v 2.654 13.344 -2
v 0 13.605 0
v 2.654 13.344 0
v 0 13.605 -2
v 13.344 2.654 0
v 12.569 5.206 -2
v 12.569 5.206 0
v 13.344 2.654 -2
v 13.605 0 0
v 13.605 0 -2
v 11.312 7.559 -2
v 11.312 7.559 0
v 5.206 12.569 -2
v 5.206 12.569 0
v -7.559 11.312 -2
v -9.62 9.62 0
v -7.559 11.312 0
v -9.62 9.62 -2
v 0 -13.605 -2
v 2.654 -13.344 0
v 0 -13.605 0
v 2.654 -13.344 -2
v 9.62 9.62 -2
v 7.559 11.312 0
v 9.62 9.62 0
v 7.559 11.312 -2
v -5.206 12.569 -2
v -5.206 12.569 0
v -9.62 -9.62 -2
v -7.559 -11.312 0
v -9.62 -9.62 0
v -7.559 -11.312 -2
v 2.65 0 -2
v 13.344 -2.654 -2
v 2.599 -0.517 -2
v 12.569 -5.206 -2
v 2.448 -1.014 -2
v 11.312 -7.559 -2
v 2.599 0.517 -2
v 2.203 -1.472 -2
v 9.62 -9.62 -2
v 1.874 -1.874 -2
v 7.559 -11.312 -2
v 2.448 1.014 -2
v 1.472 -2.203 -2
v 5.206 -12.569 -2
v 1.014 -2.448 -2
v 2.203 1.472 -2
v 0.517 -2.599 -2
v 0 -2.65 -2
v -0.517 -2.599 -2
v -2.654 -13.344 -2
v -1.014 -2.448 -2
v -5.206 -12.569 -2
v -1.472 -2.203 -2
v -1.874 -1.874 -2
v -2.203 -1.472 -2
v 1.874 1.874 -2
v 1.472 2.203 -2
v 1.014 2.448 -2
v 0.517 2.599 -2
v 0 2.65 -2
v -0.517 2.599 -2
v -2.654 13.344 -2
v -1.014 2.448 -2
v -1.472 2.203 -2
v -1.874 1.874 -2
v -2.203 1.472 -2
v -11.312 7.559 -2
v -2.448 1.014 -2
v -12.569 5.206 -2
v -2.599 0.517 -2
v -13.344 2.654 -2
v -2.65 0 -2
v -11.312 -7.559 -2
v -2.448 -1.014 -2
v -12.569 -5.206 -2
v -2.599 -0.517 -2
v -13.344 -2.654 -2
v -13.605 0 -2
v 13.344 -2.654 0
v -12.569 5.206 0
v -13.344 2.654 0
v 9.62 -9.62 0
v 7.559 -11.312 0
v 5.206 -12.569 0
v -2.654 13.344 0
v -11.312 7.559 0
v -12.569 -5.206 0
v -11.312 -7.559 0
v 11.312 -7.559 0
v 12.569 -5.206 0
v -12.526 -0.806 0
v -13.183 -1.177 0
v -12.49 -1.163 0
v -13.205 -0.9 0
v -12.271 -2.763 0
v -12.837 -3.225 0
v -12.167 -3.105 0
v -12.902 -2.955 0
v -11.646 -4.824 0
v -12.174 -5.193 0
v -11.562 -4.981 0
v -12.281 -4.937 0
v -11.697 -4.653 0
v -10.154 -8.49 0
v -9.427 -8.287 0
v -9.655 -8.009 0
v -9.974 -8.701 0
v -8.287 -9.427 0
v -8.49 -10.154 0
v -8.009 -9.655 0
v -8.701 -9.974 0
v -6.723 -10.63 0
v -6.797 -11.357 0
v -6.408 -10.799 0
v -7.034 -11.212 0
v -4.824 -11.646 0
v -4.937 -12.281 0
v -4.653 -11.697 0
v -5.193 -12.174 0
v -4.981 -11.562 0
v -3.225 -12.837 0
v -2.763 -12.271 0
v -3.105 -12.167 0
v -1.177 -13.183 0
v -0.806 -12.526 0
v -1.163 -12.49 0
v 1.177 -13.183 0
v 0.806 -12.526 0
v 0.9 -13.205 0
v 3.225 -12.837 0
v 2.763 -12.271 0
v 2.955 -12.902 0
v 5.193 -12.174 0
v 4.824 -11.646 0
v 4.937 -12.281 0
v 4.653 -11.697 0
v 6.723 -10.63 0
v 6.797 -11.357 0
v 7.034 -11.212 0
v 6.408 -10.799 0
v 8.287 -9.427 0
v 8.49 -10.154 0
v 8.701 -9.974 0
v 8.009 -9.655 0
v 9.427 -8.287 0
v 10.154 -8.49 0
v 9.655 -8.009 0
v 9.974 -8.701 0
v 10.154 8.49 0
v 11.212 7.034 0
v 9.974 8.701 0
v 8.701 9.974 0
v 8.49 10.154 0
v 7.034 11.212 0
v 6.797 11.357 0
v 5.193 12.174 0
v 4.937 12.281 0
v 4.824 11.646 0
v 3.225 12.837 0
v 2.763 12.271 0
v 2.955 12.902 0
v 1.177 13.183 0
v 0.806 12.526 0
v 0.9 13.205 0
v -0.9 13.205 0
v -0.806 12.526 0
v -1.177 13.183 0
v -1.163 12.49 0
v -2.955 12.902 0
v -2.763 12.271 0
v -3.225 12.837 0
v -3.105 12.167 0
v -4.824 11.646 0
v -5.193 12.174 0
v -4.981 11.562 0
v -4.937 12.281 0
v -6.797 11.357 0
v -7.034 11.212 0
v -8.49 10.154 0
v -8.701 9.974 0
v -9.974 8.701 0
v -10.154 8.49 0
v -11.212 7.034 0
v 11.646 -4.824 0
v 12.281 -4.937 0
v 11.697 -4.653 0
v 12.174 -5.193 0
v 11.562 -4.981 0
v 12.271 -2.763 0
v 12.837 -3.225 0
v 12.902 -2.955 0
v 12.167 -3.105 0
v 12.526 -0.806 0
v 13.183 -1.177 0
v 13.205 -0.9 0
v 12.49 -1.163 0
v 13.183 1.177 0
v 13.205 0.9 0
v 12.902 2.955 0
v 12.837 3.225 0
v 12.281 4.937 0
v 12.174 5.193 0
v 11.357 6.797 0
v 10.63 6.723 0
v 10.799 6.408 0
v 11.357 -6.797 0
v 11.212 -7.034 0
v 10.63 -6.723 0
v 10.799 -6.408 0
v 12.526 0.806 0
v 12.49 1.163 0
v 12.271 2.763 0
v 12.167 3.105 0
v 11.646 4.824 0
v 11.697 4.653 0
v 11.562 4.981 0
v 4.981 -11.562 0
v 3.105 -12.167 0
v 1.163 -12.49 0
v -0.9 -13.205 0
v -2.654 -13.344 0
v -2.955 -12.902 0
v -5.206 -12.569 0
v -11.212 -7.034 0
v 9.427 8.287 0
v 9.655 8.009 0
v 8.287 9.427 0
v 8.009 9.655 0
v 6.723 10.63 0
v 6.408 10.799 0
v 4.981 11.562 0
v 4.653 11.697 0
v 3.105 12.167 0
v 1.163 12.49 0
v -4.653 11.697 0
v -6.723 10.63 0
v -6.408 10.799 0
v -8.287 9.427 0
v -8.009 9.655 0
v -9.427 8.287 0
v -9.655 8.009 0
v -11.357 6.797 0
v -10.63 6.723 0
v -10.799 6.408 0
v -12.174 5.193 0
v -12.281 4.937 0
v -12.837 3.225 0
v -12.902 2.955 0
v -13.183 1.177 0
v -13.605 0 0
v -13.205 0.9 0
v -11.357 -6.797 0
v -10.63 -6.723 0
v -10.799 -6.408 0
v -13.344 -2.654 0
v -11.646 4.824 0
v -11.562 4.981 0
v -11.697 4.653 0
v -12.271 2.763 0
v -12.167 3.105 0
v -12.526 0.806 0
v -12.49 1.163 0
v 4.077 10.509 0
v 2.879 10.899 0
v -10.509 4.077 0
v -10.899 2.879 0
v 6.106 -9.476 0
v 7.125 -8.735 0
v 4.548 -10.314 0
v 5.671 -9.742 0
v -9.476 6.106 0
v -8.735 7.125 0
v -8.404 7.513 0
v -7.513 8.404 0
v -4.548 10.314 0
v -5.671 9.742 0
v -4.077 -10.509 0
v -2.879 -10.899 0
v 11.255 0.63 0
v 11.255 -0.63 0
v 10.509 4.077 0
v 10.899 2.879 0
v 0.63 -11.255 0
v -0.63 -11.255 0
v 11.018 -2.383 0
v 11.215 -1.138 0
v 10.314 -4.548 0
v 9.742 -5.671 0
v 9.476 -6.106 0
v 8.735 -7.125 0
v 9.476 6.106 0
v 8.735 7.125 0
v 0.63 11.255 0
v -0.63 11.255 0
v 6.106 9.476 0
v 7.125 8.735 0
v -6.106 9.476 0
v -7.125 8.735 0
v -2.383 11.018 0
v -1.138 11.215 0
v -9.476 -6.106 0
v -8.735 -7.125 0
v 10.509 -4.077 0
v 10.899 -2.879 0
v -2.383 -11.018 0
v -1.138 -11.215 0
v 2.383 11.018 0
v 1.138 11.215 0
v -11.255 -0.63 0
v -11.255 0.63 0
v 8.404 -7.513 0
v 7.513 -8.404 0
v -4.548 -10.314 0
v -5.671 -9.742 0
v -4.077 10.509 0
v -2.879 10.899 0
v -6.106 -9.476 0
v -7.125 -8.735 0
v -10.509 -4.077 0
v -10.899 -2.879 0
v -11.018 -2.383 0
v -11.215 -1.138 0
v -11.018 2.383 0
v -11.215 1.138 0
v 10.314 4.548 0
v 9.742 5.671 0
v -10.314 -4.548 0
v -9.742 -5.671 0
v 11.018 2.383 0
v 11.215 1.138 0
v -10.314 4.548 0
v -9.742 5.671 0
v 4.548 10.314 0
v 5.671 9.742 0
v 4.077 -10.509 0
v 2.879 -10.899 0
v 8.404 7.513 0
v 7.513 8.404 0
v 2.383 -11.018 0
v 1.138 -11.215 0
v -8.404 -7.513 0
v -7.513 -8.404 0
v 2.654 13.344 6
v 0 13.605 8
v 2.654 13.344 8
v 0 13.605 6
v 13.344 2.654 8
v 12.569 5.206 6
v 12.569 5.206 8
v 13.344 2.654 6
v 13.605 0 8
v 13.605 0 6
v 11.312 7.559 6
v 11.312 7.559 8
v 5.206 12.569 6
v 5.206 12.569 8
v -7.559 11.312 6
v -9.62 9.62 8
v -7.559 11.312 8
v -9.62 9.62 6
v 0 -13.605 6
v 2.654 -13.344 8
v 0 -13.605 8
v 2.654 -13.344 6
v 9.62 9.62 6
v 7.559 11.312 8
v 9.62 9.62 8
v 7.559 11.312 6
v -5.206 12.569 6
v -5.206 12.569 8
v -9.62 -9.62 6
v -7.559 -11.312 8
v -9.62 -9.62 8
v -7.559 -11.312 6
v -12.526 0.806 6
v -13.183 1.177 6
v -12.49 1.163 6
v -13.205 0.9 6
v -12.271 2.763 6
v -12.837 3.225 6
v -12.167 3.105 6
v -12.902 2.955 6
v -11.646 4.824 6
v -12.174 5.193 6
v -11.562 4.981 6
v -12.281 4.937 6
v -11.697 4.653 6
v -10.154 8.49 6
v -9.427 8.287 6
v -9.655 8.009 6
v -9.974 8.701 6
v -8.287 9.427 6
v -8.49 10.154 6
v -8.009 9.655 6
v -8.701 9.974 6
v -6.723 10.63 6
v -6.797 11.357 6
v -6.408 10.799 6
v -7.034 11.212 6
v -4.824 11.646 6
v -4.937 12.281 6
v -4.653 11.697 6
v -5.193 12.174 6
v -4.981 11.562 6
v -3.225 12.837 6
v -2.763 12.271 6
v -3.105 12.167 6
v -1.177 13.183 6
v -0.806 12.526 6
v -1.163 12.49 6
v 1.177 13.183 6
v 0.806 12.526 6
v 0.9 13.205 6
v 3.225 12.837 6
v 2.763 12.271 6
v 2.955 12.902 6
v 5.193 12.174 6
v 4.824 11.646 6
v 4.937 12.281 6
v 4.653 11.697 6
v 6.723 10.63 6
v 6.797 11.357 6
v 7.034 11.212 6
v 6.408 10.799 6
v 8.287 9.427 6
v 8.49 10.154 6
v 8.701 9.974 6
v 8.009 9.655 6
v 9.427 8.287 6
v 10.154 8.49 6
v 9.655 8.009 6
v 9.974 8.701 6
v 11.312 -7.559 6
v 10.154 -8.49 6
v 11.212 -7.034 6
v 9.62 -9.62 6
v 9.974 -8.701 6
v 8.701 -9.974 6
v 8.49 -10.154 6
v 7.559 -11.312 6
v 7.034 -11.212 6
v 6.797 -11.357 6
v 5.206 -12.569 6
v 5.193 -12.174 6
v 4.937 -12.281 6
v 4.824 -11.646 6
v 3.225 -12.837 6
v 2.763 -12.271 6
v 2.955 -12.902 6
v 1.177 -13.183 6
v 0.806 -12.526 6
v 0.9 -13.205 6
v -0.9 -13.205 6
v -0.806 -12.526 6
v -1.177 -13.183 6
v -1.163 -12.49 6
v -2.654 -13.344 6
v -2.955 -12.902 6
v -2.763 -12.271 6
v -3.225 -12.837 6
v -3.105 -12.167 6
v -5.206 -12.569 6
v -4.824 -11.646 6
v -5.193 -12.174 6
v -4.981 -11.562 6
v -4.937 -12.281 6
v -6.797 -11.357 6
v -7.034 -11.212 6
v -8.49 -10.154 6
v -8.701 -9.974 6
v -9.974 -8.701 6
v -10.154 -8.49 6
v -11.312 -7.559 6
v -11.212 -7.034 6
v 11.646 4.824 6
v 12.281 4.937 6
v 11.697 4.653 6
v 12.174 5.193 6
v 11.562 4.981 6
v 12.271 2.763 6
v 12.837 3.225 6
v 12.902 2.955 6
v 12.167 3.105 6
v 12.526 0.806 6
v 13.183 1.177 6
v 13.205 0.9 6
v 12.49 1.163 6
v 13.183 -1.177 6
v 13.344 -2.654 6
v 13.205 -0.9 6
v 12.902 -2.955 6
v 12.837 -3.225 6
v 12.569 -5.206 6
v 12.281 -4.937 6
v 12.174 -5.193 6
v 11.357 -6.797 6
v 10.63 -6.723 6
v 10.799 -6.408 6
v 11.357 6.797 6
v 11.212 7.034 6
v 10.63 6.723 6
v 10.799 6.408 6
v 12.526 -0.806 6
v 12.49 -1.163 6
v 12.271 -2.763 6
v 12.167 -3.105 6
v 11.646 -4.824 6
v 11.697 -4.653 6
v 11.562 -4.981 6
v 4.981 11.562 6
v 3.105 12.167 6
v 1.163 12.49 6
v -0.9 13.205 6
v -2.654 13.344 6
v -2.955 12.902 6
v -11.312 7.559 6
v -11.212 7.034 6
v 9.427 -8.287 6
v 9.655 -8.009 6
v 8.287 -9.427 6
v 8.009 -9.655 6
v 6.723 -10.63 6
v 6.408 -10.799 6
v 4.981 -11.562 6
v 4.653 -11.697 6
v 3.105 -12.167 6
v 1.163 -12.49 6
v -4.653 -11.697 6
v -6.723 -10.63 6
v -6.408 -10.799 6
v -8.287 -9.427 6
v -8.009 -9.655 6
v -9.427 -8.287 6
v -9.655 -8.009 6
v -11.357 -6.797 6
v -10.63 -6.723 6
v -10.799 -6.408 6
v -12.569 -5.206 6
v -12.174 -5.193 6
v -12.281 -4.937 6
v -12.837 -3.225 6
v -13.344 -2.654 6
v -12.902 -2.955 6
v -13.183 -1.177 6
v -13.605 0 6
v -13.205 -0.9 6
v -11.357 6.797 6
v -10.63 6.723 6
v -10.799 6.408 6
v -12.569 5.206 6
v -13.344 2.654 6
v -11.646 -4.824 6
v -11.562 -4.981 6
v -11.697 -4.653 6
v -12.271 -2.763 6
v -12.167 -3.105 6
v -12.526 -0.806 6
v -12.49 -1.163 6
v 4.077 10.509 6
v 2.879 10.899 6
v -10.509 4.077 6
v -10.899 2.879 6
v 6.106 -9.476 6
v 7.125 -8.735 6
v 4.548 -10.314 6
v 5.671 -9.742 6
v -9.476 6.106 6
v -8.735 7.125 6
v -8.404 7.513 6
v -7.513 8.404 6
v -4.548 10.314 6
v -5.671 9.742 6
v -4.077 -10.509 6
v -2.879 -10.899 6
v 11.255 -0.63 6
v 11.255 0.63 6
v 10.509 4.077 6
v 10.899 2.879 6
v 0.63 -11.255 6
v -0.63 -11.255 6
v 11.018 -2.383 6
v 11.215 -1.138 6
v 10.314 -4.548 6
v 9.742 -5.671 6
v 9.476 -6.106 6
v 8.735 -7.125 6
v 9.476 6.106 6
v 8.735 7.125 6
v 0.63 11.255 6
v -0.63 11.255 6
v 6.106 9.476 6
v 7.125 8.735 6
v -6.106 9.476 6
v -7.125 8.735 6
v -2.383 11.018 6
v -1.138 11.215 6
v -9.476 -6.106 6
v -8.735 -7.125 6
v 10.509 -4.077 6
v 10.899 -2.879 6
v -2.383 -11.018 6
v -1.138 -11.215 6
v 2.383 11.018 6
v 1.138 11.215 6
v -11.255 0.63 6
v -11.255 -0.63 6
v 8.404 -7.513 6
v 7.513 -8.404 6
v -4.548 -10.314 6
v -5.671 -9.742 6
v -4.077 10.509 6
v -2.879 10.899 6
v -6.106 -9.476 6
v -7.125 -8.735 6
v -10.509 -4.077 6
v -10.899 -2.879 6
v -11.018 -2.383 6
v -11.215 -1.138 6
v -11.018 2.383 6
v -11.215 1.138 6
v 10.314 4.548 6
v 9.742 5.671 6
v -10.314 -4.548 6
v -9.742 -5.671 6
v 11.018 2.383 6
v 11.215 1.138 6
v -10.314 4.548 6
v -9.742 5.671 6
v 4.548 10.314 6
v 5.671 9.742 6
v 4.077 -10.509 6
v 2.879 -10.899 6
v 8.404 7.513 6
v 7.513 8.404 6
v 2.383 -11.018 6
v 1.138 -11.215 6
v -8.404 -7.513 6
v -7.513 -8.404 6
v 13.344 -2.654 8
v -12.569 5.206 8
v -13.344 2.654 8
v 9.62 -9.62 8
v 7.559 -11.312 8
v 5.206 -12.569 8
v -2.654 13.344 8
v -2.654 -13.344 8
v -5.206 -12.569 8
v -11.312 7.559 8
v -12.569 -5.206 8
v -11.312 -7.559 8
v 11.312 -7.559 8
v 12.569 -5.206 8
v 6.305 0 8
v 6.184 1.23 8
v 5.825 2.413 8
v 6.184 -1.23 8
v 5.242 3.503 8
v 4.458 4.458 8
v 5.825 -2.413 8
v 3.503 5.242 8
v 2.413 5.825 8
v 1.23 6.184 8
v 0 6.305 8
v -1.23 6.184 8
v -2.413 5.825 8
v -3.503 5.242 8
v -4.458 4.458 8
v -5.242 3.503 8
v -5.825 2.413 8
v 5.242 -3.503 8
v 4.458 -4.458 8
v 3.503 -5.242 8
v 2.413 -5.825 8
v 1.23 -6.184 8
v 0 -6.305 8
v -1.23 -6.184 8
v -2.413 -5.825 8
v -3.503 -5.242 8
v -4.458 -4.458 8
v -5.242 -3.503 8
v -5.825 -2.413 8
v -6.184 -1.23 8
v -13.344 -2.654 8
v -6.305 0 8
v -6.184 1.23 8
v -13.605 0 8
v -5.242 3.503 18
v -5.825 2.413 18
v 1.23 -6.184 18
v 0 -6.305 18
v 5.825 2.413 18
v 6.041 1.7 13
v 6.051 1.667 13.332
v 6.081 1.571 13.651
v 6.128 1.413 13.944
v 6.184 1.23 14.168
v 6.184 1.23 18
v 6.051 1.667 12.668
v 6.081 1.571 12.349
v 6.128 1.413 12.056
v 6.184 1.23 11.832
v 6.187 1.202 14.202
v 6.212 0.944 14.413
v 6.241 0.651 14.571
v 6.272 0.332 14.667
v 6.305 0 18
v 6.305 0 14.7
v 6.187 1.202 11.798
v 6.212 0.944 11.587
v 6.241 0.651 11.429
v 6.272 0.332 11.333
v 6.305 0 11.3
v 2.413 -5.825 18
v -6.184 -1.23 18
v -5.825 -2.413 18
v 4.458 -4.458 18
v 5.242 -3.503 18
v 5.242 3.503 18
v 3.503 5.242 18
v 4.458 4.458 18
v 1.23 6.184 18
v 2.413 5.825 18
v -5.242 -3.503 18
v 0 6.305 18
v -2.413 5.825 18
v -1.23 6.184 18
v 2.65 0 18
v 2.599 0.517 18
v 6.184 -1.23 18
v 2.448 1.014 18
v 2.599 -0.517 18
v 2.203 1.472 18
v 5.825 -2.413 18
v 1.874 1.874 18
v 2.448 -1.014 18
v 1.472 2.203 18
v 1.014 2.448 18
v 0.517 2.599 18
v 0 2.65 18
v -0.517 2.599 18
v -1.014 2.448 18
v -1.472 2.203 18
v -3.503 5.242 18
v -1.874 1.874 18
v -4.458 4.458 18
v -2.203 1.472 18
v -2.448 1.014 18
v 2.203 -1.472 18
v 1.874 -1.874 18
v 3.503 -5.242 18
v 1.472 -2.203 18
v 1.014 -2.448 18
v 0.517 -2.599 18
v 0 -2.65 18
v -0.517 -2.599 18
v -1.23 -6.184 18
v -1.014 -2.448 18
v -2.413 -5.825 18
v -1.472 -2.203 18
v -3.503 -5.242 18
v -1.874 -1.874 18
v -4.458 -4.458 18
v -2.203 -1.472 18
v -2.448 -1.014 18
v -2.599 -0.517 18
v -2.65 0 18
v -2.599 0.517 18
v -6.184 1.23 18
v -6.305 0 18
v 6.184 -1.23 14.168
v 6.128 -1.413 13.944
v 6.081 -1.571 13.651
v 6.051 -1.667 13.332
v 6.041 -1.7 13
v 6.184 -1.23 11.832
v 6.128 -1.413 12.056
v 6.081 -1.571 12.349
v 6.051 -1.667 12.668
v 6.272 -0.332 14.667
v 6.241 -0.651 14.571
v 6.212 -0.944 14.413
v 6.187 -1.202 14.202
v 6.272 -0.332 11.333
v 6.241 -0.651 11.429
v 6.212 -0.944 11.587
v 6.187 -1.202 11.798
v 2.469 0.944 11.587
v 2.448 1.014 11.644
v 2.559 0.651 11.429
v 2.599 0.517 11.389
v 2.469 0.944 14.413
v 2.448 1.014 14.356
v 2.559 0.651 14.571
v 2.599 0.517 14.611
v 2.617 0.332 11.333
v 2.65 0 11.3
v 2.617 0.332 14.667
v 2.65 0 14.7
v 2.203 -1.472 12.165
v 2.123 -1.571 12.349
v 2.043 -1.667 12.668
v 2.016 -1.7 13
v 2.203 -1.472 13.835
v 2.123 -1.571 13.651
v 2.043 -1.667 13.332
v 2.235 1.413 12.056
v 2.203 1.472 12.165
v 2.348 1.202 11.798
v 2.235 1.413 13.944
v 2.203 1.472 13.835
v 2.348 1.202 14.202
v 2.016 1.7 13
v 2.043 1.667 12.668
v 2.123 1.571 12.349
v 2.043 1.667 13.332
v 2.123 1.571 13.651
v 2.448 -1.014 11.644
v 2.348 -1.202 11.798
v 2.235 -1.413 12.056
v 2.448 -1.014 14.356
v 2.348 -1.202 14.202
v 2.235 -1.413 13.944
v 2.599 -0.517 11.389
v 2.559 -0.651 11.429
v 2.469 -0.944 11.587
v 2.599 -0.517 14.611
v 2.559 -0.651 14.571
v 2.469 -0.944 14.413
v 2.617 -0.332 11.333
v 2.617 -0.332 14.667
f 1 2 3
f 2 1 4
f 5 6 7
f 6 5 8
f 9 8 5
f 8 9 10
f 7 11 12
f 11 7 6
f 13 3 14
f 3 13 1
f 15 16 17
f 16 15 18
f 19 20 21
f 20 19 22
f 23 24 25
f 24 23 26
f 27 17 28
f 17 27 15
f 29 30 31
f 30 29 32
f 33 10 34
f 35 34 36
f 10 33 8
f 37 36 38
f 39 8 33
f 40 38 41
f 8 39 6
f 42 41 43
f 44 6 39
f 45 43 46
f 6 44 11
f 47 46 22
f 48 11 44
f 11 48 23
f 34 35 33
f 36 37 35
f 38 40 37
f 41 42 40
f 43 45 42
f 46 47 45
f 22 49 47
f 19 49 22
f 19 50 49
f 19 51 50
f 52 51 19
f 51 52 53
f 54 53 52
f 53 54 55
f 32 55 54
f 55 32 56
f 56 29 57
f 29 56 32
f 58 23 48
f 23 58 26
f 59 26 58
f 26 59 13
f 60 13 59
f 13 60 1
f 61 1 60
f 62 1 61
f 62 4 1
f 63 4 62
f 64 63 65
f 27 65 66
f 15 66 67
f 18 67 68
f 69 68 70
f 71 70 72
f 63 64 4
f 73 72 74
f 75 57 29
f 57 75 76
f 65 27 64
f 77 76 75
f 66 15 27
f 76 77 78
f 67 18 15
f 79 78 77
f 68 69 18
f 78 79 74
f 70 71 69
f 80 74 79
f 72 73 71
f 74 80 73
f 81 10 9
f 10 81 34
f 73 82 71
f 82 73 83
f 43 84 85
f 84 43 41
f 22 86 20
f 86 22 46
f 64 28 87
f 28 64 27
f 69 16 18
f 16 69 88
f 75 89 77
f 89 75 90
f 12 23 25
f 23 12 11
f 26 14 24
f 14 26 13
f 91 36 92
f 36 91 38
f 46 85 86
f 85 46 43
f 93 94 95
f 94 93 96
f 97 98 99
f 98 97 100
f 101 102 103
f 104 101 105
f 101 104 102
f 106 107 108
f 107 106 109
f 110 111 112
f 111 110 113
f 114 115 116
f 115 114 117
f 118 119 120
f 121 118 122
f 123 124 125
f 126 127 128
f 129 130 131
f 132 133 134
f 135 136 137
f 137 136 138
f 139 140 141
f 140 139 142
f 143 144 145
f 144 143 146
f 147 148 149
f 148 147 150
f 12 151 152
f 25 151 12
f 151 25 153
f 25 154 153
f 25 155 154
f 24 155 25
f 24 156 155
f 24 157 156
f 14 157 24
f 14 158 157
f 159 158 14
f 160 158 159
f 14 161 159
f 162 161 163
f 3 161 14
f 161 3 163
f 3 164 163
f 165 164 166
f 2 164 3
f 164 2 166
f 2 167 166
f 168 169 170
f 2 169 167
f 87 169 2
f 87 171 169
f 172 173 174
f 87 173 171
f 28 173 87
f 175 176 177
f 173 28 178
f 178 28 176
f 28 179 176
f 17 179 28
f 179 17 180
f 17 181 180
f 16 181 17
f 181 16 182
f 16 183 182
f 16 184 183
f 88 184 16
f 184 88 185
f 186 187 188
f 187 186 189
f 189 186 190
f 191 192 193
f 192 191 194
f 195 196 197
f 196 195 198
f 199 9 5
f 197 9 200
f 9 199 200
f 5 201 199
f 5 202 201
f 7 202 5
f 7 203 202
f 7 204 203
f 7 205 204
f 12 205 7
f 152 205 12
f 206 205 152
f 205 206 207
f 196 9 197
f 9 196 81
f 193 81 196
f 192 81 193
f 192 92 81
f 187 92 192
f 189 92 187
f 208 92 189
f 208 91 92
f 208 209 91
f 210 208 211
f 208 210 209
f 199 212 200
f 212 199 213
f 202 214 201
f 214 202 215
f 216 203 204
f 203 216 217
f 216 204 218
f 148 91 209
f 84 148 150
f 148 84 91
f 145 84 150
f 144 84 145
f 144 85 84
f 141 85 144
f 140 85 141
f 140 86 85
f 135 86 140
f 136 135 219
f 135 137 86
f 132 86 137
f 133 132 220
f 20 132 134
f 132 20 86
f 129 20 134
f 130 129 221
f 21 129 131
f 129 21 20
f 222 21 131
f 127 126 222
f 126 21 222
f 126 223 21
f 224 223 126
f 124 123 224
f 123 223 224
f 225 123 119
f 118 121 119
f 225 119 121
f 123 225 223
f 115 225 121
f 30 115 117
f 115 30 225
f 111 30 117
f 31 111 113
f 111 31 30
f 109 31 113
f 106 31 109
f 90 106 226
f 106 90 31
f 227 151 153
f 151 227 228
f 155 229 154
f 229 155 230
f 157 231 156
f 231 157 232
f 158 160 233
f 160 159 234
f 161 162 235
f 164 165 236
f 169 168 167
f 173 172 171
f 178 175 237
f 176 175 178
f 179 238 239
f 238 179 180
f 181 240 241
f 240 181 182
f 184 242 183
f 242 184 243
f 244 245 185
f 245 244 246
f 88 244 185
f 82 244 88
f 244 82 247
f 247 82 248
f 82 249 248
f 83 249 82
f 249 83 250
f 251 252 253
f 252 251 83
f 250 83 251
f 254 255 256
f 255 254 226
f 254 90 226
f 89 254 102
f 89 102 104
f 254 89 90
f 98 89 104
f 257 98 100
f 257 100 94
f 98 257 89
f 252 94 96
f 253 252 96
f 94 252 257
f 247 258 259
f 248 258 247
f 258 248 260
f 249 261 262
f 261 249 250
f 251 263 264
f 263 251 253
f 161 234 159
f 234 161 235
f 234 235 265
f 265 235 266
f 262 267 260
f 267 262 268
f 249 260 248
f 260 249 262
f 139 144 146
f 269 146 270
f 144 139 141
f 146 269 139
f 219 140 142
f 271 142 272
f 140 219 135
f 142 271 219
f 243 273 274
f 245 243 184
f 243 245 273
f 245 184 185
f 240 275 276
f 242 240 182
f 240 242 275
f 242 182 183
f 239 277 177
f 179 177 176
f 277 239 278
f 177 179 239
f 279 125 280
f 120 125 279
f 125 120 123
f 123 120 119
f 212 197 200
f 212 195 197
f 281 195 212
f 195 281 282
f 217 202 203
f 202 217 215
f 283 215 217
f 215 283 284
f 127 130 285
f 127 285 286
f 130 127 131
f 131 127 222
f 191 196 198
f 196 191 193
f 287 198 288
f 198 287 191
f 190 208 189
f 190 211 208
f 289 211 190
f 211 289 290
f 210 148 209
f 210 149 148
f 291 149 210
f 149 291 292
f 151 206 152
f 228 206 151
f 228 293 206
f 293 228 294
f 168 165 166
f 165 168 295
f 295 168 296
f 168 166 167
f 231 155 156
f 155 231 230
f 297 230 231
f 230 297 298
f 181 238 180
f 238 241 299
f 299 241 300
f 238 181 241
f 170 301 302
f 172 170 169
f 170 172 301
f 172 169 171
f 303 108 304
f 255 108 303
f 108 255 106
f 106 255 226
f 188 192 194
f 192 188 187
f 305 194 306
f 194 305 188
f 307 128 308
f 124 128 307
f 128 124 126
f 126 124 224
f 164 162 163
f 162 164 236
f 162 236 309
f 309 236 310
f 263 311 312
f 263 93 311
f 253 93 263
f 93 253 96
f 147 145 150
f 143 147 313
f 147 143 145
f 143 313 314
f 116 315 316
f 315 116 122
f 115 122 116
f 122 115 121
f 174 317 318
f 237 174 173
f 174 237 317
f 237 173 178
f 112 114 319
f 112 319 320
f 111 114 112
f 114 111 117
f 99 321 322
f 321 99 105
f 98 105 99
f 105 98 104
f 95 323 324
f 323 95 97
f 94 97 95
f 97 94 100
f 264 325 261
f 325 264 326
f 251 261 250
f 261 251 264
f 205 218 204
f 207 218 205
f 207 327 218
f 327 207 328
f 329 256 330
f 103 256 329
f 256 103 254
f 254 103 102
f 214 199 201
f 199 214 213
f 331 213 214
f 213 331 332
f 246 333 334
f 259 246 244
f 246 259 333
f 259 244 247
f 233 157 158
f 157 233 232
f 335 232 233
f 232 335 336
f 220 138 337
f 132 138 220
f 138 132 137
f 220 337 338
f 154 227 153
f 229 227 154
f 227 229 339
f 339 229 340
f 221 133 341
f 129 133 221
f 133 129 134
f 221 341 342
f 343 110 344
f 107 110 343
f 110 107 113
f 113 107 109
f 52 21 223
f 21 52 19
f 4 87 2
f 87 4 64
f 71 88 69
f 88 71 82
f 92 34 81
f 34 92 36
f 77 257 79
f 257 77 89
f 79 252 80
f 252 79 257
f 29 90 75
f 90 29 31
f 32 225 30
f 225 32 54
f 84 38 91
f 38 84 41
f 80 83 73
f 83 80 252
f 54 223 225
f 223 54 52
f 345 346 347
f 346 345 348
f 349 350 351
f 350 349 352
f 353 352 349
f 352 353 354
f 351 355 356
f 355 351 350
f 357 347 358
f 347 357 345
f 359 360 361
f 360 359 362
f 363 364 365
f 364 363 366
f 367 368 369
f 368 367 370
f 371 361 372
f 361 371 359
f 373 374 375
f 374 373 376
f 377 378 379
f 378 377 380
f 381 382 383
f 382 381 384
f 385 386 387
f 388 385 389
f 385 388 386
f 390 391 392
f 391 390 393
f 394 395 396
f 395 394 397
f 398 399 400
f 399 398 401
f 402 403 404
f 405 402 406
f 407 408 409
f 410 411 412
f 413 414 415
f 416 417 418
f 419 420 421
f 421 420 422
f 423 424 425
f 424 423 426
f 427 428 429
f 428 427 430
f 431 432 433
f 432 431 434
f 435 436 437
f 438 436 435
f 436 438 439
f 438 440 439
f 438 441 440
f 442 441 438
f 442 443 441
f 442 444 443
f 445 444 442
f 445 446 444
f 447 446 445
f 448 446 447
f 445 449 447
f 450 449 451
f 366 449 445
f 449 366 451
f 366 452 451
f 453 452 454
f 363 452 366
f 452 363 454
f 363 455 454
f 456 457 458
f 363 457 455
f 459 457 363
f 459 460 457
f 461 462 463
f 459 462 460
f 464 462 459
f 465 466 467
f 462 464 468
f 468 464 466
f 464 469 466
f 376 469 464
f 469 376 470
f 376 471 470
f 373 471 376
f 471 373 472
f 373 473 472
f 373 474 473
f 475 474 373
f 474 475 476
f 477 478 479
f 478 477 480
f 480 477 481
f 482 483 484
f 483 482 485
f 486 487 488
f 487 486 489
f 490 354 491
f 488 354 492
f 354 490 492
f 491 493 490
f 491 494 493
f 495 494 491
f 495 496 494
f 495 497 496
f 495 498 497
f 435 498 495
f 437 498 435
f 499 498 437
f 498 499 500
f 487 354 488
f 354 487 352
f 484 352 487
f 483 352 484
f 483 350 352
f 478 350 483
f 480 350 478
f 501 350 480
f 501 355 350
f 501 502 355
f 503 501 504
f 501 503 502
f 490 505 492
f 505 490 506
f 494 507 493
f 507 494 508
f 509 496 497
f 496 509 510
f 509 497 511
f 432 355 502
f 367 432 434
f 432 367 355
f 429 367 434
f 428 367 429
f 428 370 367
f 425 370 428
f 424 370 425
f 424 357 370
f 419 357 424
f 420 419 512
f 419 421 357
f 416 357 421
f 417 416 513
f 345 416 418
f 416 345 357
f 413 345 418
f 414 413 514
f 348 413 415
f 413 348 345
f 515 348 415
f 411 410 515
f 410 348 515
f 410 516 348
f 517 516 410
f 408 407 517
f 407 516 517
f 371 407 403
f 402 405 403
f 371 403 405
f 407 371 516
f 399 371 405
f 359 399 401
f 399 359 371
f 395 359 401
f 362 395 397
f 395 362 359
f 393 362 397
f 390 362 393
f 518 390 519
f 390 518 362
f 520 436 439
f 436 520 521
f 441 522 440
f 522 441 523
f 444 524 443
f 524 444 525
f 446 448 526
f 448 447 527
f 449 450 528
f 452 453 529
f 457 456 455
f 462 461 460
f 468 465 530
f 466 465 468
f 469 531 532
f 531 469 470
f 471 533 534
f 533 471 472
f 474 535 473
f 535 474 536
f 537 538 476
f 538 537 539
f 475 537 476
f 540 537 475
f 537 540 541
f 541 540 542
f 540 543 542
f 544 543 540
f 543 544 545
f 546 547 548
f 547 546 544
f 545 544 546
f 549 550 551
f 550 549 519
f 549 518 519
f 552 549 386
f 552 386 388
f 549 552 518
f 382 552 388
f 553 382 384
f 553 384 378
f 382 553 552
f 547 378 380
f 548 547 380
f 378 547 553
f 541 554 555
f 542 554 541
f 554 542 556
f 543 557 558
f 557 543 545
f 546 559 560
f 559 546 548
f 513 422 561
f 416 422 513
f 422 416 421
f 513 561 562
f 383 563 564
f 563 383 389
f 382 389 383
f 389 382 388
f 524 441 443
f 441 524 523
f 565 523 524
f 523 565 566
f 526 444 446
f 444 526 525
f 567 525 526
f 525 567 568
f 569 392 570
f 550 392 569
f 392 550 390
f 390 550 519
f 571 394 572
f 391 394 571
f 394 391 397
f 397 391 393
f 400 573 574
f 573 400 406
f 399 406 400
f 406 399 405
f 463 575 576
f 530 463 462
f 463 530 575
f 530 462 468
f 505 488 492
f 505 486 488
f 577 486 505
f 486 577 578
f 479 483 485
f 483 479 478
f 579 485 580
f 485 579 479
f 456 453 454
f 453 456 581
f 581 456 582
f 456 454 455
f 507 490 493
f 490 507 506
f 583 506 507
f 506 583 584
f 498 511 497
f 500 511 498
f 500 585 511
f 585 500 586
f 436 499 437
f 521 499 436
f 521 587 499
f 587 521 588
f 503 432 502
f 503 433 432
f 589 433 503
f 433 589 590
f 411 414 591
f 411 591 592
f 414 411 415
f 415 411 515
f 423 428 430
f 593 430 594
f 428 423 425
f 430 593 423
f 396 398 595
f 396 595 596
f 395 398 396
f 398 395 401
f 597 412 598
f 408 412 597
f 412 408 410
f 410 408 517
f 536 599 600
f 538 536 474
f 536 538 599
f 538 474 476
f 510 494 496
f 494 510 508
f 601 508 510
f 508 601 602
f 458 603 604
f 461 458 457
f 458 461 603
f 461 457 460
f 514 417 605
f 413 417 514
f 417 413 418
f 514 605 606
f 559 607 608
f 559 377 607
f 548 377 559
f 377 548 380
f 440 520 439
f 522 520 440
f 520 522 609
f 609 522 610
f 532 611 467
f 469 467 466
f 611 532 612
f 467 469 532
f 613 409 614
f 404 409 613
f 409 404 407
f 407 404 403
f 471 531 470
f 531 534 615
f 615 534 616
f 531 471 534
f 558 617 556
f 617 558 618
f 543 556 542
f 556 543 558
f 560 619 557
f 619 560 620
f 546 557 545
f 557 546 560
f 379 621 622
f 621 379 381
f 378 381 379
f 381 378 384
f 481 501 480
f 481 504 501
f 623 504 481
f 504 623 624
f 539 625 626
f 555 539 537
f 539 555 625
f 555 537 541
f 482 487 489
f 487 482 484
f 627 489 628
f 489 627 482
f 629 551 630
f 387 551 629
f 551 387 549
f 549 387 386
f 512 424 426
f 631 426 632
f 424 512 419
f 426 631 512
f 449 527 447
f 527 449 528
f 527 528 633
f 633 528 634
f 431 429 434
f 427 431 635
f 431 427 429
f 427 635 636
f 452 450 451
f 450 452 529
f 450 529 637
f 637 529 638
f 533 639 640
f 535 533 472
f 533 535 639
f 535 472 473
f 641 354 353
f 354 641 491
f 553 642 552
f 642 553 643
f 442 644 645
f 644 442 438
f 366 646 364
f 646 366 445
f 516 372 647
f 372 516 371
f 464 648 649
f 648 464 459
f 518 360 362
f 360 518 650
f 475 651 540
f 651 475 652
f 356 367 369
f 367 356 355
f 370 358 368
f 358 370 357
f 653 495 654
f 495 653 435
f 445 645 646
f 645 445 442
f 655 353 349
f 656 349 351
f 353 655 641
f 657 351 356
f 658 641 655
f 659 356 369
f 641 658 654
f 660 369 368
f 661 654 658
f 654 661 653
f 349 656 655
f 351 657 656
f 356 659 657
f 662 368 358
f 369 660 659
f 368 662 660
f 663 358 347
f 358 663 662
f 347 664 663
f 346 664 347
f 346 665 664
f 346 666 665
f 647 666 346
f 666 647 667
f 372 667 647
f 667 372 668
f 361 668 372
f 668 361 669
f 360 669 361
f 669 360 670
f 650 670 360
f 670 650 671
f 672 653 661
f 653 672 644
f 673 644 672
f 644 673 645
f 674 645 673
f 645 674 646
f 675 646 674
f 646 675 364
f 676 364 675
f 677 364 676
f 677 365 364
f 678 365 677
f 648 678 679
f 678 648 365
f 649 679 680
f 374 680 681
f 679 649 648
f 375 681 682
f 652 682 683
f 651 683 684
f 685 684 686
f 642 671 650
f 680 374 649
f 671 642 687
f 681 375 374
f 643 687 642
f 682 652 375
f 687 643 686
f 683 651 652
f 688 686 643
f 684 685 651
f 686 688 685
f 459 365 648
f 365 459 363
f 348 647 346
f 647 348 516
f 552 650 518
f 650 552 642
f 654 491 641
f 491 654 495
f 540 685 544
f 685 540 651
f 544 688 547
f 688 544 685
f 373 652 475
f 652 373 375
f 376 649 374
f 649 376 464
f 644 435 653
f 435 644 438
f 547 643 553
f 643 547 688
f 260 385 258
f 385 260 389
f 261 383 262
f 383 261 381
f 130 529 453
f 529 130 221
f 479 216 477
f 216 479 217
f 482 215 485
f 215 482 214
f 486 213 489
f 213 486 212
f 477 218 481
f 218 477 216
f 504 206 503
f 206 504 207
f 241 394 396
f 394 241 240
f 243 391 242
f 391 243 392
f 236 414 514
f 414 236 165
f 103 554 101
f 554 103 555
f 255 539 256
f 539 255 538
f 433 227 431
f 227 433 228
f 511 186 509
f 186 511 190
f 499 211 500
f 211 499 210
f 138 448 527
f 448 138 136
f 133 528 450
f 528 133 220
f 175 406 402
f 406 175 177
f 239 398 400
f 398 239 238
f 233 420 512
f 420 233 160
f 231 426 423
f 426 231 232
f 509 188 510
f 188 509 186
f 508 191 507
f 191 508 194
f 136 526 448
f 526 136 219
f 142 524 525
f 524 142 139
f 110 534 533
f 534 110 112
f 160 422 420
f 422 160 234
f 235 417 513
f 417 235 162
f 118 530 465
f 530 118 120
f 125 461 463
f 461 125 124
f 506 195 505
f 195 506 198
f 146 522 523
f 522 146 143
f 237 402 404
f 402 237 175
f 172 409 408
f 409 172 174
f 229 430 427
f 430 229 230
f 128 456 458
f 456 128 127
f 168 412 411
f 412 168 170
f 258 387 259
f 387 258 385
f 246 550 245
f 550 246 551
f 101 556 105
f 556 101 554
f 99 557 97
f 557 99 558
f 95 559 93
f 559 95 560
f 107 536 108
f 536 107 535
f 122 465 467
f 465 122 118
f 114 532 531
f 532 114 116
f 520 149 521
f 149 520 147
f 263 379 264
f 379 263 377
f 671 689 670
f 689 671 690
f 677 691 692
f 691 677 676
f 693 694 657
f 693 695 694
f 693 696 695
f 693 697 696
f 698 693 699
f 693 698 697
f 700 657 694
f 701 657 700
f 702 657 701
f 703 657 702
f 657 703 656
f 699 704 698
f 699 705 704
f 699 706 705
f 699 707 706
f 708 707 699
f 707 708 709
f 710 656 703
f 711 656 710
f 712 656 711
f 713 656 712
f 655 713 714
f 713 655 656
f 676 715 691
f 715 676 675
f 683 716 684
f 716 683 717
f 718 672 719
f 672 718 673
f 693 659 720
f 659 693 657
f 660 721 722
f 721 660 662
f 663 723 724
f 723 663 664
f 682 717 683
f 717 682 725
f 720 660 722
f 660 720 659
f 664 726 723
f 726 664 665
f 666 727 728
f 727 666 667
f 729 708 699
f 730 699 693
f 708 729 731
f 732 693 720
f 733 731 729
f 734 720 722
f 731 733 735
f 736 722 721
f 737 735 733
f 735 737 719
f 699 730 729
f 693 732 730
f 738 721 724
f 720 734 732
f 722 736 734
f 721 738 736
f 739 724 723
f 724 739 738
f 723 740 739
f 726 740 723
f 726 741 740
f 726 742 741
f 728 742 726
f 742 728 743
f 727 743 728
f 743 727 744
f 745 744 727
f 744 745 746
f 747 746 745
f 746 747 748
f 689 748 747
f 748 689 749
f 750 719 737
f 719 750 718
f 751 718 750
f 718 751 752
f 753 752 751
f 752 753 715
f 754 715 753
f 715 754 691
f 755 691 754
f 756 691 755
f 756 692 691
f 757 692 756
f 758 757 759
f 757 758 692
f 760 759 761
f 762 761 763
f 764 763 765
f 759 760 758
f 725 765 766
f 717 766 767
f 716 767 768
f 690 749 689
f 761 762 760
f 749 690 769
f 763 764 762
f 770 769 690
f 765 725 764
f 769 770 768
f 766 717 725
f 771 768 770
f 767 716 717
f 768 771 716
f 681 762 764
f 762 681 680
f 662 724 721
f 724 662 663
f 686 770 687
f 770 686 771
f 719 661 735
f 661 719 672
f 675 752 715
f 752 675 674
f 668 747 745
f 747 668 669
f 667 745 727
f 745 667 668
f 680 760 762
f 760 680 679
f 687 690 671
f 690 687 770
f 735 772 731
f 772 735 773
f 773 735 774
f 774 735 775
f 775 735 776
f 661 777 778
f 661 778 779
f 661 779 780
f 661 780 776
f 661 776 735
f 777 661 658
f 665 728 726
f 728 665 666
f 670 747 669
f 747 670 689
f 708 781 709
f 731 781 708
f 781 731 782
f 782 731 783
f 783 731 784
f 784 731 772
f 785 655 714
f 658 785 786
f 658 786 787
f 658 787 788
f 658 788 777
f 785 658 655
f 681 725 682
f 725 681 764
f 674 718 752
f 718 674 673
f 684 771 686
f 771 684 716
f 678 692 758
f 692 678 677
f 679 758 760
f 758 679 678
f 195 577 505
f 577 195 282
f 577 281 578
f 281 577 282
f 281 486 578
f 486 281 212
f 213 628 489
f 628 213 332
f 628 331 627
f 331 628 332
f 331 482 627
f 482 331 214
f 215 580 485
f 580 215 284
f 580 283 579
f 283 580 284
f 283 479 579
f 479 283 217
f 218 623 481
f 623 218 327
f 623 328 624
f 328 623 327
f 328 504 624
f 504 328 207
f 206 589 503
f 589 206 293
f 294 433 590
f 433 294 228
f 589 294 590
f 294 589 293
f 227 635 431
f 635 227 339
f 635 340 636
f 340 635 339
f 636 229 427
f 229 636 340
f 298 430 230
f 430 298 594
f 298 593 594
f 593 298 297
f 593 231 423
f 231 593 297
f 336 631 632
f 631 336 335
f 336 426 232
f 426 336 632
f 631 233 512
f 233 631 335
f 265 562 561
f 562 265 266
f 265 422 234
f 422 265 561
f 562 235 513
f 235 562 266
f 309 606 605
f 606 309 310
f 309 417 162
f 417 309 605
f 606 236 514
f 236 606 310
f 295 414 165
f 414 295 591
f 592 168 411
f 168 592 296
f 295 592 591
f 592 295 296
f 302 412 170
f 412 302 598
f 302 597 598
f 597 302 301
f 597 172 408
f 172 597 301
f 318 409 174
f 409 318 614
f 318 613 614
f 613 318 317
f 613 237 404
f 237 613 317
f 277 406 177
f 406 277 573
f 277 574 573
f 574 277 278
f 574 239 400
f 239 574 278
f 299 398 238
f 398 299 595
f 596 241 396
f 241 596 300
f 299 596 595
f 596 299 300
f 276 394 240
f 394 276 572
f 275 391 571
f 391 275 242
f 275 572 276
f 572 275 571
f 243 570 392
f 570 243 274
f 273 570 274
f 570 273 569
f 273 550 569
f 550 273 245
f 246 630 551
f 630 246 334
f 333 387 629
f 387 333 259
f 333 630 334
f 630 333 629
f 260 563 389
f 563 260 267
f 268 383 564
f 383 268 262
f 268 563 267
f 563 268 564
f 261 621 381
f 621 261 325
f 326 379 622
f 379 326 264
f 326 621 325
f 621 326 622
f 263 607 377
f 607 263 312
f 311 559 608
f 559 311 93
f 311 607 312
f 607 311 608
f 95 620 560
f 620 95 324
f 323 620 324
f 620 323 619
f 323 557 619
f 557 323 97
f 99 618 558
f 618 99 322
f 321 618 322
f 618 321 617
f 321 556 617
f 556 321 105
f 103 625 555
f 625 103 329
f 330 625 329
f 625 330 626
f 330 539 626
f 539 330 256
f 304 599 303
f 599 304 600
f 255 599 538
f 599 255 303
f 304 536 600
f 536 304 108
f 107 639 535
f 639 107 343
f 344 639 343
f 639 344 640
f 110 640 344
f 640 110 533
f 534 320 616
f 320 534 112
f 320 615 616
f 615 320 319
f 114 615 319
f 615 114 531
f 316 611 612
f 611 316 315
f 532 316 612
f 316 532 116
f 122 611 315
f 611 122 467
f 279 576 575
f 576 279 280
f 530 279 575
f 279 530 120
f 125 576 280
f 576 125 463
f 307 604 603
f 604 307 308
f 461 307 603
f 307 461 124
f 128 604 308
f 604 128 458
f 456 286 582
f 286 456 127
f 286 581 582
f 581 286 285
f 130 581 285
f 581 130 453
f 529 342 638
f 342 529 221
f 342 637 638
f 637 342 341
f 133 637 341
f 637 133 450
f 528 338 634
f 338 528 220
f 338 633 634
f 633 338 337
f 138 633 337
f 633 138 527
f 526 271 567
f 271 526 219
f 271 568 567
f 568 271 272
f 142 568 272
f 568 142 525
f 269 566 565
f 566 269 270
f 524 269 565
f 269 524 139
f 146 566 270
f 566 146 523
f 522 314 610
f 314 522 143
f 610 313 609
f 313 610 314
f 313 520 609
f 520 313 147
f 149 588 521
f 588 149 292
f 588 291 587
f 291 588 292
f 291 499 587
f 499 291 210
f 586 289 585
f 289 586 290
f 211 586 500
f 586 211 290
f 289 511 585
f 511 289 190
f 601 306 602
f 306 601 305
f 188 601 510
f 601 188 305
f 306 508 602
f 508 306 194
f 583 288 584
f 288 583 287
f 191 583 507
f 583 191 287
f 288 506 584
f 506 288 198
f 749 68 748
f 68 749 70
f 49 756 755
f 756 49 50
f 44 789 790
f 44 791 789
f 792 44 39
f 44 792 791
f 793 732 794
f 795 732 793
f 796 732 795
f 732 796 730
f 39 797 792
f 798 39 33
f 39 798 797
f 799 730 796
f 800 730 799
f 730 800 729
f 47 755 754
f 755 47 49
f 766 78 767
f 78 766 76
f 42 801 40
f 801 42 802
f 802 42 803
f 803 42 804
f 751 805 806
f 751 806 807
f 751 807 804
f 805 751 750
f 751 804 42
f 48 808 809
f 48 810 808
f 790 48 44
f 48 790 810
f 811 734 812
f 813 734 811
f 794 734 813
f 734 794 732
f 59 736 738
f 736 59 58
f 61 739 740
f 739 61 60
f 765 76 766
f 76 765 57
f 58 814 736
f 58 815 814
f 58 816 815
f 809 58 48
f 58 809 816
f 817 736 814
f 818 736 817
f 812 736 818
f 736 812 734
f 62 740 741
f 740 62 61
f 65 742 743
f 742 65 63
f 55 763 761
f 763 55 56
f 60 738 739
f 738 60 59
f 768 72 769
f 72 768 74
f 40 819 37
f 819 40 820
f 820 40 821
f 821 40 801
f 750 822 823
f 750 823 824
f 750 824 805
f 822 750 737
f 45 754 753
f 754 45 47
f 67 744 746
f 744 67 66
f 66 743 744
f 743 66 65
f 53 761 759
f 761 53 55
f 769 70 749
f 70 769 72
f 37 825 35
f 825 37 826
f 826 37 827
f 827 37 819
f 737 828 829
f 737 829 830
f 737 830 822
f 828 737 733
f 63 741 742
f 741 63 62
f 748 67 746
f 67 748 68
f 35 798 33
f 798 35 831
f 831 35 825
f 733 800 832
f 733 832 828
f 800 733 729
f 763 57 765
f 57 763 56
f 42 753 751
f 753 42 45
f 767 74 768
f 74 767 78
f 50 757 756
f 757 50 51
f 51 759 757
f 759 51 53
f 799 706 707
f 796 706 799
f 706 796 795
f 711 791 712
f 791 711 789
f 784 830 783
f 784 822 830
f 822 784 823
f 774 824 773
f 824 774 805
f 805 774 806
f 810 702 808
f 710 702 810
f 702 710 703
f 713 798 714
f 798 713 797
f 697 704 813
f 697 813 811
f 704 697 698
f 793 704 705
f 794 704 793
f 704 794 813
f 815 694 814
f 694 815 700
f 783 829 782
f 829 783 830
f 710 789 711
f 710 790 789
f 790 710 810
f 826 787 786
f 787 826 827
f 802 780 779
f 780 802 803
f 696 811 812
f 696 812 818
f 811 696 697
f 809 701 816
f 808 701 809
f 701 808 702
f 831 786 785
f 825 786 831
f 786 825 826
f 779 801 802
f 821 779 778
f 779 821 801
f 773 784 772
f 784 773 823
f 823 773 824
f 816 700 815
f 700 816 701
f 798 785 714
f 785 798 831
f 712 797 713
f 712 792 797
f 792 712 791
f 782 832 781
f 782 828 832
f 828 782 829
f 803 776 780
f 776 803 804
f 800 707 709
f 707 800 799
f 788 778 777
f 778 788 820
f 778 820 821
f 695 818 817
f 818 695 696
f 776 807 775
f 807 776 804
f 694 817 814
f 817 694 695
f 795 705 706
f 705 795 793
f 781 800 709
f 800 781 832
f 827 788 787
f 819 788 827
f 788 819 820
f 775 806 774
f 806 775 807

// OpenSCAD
$fn = 32;

// ----------------------------------------------------------------------
// Timing pulley: GT2 40T, pitch 2 mm, 27.21 mm x 20 mm
// ----------------------------------------------------------------------

// --- parameters (mm) ---
pitch_mm = 2;             // belt pitch
tooth_count = 40;         // number of grooves
width = 6;                // belt width between the flanges
tip_d = 25.21;            // tip circle diameter
root_d = 23.71;           // groove bottom diameter
groove_h = 0.75;          // groove depth
tooth_w = 1.5;            // groove width at the tip circle
side_d = 27.21;           // flange diameter
side_t = 2;               // flange thickness
spigot_d = 22.11;         // flange spigot, sunk into the rim
spigot_h = 1.2;           // spigot depth into the rim
hub_bore = 5.3;           // shaft bore
hub_d = 12.61;            // hub diameter
hub_h = 10;               // hub above the flange
bottom_z = -2;            // lowest point of the pulley
top_z = 18;               // highest point of the pulley
set_d = 3.4;              // set screw tap hole

module rim() {
  cylinder(h = width, d = tip_d);
}

module groove_cutter() {
  /* belt tooth groove: deeper than wide, cut through the belt width */
  translate([root_d / 2, 0, 0])
    linear_extrude(height = width)
      polygon(points = [[-0.6, -tooth_w * 0.42], [groove_h + 0.6, -tooth_w * 0.6],
                        [groove_h + 0.6, tooth_w * 0.6], [-0.6, tooth_w * 0.42]]);
}

module flanges() {
  translate([0, 0, -side_t]) cylinder(h = side_t, d = side_d);
  translate([0, 0, width]) cylinder(h = side_t, d = side_d);
  translate([0, 0, -spigot_h]) cylinder(h = spigot_h + 0.6, d = spigot_d);
  translate([0, 0, width - 0.6]) cylinder(h = spigot_h + 0.6, d = spigot_d);
}

module hub() {
  translate([0, 0, bottom_z]) cylinder(h = top_z - bottom_z, d = hub_d);
}

difference() {
  union() {
    rim();
    hub();
    flanges();
  }
  for (i = [0 : tooth_count - 1]) rotate([0, 0, i * 360 / tooth_count]) groove_cutter();
  translate([0, 0, bottom_z - 1]) cylinder(h = top_z - bottom_z + 2, d = hub_bore);
  translate([-1, 0, top_z - hub_h * 0.5]) rotate([0, 90, 0]) cylinder(h = hub_d / 2 + 3, d = set_d);
}
